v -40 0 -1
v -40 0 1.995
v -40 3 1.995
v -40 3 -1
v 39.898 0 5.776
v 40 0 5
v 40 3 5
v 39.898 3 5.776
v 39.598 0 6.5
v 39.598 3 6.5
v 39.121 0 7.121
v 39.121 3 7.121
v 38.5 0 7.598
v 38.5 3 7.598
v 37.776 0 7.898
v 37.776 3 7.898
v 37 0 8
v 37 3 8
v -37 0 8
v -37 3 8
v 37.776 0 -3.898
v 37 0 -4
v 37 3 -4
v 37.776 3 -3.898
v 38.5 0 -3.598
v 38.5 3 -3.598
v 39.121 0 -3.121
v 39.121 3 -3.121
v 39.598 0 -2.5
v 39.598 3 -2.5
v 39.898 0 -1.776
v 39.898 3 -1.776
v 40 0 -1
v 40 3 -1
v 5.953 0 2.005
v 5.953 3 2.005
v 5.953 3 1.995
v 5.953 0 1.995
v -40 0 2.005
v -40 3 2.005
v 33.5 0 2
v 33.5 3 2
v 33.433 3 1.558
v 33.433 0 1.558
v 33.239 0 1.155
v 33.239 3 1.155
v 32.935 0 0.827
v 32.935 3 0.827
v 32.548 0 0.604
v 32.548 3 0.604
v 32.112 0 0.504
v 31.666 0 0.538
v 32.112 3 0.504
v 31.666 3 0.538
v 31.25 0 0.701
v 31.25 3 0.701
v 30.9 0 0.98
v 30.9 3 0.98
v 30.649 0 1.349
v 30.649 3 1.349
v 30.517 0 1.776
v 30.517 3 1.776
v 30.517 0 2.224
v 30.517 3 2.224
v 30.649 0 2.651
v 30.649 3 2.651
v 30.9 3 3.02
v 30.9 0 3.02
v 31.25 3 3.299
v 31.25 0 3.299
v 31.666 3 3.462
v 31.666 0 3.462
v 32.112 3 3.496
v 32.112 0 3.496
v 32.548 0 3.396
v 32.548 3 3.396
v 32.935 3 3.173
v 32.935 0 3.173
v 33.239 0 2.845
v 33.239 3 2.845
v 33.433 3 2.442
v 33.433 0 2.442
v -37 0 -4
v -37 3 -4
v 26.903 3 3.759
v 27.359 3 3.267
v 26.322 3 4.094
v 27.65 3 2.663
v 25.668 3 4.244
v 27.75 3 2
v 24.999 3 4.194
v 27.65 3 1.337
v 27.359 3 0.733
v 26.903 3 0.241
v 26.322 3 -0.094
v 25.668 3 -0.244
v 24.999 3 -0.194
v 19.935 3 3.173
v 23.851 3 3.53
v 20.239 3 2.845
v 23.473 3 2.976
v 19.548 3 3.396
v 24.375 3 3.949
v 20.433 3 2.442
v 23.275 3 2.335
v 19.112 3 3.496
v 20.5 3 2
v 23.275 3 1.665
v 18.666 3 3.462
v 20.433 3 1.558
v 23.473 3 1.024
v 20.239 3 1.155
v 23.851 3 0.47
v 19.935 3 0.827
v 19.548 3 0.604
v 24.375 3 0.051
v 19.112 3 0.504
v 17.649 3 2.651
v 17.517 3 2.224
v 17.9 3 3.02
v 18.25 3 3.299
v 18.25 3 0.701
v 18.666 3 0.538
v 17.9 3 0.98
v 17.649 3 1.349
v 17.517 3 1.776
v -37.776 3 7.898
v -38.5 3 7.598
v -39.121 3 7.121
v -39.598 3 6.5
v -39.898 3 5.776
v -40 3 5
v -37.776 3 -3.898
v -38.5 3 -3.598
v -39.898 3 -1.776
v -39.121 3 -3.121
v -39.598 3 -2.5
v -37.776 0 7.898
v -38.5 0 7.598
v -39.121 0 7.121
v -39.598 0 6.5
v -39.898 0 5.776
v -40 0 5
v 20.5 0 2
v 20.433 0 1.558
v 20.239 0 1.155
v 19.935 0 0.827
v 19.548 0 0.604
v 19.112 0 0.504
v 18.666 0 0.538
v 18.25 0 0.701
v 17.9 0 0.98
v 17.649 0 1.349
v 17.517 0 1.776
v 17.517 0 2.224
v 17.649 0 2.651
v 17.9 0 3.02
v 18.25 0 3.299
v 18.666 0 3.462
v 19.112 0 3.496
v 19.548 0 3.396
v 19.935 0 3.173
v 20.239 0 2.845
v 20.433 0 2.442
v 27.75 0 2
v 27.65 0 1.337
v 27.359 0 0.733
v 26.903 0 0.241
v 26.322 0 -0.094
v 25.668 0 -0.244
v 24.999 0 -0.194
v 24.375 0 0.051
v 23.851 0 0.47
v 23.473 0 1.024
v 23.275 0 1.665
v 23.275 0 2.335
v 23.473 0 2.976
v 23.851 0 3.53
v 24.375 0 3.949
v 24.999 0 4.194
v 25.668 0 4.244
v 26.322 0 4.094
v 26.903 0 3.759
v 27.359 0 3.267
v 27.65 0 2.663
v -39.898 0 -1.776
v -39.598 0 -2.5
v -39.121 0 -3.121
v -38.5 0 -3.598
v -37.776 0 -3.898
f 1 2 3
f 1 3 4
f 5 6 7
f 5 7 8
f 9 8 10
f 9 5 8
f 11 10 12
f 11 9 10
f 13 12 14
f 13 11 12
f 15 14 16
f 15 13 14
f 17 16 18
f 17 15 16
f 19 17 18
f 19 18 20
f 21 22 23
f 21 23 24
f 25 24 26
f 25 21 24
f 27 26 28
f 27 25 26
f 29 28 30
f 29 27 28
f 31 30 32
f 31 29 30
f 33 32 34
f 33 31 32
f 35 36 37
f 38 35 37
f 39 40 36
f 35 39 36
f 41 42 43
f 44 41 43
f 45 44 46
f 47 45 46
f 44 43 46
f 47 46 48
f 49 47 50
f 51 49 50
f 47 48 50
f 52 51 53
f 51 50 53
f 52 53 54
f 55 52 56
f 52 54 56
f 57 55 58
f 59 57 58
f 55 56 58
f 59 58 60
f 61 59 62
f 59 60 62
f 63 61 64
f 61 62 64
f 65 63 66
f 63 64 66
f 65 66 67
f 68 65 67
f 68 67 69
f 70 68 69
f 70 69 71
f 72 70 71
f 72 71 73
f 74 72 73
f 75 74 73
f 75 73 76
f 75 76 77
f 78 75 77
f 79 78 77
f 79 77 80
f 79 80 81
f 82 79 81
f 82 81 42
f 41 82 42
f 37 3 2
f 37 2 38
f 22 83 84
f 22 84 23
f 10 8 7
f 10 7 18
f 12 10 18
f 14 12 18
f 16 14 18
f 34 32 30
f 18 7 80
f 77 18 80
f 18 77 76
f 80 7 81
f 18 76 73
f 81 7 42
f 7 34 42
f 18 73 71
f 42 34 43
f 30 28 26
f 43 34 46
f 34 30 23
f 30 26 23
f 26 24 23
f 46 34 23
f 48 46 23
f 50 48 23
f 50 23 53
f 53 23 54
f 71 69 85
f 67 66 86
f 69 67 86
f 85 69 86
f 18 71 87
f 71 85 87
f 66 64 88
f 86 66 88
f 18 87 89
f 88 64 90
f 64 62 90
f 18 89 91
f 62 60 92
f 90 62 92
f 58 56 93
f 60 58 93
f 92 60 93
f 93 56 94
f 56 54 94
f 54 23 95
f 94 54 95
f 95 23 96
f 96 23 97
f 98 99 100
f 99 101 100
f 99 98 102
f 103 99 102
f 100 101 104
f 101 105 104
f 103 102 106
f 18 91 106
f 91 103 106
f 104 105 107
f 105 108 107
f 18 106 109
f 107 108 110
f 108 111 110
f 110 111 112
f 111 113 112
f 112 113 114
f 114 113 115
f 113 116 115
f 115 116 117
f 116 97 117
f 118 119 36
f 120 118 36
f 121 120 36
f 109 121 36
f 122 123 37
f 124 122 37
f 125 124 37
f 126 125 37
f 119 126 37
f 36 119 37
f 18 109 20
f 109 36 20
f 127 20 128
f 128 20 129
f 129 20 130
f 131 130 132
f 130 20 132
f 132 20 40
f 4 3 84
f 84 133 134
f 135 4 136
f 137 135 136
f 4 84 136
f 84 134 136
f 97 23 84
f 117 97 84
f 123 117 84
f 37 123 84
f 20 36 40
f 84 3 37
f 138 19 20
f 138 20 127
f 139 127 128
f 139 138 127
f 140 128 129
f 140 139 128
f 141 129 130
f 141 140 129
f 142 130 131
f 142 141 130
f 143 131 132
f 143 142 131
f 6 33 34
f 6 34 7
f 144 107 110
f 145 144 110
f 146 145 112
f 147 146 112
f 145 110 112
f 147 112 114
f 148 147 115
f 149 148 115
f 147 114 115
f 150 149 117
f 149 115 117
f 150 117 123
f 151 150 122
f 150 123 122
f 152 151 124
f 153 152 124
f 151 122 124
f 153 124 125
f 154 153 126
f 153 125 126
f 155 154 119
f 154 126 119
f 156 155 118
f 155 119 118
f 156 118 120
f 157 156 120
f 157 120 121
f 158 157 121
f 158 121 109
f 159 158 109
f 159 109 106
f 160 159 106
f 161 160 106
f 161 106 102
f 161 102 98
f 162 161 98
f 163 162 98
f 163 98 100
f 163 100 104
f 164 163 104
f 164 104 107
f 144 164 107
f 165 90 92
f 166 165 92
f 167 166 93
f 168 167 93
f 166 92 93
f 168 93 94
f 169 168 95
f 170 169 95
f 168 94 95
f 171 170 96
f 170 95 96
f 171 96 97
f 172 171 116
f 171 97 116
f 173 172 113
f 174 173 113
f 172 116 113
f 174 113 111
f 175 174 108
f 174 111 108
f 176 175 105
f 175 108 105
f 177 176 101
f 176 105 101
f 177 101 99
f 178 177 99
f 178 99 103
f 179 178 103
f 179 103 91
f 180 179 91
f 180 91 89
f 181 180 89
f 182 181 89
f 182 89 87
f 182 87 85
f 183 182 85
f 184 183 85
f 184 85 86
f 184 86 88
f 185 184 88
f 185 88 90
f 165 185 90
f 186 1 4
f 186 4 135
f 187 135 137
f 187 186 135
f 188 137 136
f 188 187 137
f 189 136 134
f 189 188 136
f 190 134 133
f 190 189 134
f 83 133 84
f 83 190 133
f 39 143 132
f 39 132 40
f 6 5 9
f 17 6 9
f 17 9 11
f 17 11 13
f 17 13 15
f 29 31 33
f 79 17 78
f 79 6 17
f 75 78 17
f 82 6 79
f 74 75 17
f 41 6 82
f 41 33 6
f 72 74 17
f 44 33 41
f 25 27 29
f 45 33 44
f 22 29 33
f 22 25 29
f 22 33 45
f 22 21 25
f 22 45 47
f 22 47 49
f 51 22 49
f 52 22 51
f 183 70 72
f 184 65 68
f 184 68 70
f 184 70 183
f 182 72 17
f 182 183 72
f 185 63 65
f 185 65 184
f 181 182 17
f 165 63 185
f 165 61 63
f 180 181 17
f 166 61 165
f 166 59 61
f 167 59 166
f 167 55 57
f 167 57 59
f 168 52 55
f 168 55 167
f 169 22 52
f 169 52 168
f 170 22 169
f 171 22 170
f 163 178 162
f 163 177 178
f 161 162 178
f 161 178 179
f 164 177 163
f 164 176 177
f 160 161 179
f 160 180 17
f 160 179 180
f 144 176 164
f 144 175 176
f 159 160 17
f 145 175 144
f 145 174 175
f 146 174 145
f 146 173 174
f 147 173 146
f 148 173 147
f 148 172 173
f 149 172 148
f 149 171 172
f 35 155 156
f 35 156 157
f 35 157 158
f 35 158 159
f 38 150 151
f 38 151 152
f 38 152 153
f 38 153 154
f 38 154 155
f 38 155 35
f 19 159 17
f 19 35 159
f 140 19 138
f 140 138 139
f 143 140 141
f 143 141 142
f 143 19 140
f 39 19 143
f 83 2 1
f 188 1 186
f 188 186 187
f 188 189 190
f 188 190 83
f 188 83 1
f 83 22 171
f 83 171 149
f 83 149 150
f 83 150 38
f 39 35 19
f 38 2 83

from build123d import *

# Parameters (mm, degrees)
BOSS_EXTRUDE1_DEPTH = 3
SKETCH2_R           = 1.5
SKETCH2_R_2         = 2.25
SKETCH2_W           = 45.952575141
SKETCH2_H           = 0.01
CUT_EXTRUDE1_DEPTH  = 4


with BuildPart() as part:
    # Sketch1 → Boss-Extrude1 (new body)
    with BuildSketch(Plane(origin=(0, 0, 0), x_dir=(1, 0, 0), z_dir=(0, 1, 0))):
        with BuildLine():
            Line((-37, 4), (37, 4))
            ThreePointArc((37, 4), (39.121320344, 3.121320344), (40, 1))
            Line((40, 1), (40, -5))
            ThreePointArc((40, -5), (39.121320344, -7.121320344), (37, -8))
            Line((37, -8), (-37, -8))
            ThreePointArc((-37, -8), (-39.121320344, -7.121320344), (-40, -5))
            Line((-40, -5), (-40, 1))
            ThreePointArc((-40, 1), (-39.121320344, 3.121320344), (-37, 4))
        make_face()
    extrude(amount=BOSS_EXTRUDE1_DEPTH)

    # Sketch2 → Cut-Extrude1 (cut, through all)
    with BuildSketch(Plane(origin=(0, 3, 0), x_dir=(1, 0, 0), z_dir=(0, 1, 0))):
        with Locations((32, -2)):
            Circle(SKETCH2_R)
        with Locations((25.5, -2)):
            Circle(SKETCH2_R_2)
        with Locations((19, -2)):
            Circle(SKETCH2_R)
        with Locations((-17.02371243, -2)):
            Rectangle(SKETCH2_W, SKETCH2_H)
    extrude(amount=-CUT_EXTRUDE1_DEPTH, mode=Mode.SUBTRACT)


solid = part.part
